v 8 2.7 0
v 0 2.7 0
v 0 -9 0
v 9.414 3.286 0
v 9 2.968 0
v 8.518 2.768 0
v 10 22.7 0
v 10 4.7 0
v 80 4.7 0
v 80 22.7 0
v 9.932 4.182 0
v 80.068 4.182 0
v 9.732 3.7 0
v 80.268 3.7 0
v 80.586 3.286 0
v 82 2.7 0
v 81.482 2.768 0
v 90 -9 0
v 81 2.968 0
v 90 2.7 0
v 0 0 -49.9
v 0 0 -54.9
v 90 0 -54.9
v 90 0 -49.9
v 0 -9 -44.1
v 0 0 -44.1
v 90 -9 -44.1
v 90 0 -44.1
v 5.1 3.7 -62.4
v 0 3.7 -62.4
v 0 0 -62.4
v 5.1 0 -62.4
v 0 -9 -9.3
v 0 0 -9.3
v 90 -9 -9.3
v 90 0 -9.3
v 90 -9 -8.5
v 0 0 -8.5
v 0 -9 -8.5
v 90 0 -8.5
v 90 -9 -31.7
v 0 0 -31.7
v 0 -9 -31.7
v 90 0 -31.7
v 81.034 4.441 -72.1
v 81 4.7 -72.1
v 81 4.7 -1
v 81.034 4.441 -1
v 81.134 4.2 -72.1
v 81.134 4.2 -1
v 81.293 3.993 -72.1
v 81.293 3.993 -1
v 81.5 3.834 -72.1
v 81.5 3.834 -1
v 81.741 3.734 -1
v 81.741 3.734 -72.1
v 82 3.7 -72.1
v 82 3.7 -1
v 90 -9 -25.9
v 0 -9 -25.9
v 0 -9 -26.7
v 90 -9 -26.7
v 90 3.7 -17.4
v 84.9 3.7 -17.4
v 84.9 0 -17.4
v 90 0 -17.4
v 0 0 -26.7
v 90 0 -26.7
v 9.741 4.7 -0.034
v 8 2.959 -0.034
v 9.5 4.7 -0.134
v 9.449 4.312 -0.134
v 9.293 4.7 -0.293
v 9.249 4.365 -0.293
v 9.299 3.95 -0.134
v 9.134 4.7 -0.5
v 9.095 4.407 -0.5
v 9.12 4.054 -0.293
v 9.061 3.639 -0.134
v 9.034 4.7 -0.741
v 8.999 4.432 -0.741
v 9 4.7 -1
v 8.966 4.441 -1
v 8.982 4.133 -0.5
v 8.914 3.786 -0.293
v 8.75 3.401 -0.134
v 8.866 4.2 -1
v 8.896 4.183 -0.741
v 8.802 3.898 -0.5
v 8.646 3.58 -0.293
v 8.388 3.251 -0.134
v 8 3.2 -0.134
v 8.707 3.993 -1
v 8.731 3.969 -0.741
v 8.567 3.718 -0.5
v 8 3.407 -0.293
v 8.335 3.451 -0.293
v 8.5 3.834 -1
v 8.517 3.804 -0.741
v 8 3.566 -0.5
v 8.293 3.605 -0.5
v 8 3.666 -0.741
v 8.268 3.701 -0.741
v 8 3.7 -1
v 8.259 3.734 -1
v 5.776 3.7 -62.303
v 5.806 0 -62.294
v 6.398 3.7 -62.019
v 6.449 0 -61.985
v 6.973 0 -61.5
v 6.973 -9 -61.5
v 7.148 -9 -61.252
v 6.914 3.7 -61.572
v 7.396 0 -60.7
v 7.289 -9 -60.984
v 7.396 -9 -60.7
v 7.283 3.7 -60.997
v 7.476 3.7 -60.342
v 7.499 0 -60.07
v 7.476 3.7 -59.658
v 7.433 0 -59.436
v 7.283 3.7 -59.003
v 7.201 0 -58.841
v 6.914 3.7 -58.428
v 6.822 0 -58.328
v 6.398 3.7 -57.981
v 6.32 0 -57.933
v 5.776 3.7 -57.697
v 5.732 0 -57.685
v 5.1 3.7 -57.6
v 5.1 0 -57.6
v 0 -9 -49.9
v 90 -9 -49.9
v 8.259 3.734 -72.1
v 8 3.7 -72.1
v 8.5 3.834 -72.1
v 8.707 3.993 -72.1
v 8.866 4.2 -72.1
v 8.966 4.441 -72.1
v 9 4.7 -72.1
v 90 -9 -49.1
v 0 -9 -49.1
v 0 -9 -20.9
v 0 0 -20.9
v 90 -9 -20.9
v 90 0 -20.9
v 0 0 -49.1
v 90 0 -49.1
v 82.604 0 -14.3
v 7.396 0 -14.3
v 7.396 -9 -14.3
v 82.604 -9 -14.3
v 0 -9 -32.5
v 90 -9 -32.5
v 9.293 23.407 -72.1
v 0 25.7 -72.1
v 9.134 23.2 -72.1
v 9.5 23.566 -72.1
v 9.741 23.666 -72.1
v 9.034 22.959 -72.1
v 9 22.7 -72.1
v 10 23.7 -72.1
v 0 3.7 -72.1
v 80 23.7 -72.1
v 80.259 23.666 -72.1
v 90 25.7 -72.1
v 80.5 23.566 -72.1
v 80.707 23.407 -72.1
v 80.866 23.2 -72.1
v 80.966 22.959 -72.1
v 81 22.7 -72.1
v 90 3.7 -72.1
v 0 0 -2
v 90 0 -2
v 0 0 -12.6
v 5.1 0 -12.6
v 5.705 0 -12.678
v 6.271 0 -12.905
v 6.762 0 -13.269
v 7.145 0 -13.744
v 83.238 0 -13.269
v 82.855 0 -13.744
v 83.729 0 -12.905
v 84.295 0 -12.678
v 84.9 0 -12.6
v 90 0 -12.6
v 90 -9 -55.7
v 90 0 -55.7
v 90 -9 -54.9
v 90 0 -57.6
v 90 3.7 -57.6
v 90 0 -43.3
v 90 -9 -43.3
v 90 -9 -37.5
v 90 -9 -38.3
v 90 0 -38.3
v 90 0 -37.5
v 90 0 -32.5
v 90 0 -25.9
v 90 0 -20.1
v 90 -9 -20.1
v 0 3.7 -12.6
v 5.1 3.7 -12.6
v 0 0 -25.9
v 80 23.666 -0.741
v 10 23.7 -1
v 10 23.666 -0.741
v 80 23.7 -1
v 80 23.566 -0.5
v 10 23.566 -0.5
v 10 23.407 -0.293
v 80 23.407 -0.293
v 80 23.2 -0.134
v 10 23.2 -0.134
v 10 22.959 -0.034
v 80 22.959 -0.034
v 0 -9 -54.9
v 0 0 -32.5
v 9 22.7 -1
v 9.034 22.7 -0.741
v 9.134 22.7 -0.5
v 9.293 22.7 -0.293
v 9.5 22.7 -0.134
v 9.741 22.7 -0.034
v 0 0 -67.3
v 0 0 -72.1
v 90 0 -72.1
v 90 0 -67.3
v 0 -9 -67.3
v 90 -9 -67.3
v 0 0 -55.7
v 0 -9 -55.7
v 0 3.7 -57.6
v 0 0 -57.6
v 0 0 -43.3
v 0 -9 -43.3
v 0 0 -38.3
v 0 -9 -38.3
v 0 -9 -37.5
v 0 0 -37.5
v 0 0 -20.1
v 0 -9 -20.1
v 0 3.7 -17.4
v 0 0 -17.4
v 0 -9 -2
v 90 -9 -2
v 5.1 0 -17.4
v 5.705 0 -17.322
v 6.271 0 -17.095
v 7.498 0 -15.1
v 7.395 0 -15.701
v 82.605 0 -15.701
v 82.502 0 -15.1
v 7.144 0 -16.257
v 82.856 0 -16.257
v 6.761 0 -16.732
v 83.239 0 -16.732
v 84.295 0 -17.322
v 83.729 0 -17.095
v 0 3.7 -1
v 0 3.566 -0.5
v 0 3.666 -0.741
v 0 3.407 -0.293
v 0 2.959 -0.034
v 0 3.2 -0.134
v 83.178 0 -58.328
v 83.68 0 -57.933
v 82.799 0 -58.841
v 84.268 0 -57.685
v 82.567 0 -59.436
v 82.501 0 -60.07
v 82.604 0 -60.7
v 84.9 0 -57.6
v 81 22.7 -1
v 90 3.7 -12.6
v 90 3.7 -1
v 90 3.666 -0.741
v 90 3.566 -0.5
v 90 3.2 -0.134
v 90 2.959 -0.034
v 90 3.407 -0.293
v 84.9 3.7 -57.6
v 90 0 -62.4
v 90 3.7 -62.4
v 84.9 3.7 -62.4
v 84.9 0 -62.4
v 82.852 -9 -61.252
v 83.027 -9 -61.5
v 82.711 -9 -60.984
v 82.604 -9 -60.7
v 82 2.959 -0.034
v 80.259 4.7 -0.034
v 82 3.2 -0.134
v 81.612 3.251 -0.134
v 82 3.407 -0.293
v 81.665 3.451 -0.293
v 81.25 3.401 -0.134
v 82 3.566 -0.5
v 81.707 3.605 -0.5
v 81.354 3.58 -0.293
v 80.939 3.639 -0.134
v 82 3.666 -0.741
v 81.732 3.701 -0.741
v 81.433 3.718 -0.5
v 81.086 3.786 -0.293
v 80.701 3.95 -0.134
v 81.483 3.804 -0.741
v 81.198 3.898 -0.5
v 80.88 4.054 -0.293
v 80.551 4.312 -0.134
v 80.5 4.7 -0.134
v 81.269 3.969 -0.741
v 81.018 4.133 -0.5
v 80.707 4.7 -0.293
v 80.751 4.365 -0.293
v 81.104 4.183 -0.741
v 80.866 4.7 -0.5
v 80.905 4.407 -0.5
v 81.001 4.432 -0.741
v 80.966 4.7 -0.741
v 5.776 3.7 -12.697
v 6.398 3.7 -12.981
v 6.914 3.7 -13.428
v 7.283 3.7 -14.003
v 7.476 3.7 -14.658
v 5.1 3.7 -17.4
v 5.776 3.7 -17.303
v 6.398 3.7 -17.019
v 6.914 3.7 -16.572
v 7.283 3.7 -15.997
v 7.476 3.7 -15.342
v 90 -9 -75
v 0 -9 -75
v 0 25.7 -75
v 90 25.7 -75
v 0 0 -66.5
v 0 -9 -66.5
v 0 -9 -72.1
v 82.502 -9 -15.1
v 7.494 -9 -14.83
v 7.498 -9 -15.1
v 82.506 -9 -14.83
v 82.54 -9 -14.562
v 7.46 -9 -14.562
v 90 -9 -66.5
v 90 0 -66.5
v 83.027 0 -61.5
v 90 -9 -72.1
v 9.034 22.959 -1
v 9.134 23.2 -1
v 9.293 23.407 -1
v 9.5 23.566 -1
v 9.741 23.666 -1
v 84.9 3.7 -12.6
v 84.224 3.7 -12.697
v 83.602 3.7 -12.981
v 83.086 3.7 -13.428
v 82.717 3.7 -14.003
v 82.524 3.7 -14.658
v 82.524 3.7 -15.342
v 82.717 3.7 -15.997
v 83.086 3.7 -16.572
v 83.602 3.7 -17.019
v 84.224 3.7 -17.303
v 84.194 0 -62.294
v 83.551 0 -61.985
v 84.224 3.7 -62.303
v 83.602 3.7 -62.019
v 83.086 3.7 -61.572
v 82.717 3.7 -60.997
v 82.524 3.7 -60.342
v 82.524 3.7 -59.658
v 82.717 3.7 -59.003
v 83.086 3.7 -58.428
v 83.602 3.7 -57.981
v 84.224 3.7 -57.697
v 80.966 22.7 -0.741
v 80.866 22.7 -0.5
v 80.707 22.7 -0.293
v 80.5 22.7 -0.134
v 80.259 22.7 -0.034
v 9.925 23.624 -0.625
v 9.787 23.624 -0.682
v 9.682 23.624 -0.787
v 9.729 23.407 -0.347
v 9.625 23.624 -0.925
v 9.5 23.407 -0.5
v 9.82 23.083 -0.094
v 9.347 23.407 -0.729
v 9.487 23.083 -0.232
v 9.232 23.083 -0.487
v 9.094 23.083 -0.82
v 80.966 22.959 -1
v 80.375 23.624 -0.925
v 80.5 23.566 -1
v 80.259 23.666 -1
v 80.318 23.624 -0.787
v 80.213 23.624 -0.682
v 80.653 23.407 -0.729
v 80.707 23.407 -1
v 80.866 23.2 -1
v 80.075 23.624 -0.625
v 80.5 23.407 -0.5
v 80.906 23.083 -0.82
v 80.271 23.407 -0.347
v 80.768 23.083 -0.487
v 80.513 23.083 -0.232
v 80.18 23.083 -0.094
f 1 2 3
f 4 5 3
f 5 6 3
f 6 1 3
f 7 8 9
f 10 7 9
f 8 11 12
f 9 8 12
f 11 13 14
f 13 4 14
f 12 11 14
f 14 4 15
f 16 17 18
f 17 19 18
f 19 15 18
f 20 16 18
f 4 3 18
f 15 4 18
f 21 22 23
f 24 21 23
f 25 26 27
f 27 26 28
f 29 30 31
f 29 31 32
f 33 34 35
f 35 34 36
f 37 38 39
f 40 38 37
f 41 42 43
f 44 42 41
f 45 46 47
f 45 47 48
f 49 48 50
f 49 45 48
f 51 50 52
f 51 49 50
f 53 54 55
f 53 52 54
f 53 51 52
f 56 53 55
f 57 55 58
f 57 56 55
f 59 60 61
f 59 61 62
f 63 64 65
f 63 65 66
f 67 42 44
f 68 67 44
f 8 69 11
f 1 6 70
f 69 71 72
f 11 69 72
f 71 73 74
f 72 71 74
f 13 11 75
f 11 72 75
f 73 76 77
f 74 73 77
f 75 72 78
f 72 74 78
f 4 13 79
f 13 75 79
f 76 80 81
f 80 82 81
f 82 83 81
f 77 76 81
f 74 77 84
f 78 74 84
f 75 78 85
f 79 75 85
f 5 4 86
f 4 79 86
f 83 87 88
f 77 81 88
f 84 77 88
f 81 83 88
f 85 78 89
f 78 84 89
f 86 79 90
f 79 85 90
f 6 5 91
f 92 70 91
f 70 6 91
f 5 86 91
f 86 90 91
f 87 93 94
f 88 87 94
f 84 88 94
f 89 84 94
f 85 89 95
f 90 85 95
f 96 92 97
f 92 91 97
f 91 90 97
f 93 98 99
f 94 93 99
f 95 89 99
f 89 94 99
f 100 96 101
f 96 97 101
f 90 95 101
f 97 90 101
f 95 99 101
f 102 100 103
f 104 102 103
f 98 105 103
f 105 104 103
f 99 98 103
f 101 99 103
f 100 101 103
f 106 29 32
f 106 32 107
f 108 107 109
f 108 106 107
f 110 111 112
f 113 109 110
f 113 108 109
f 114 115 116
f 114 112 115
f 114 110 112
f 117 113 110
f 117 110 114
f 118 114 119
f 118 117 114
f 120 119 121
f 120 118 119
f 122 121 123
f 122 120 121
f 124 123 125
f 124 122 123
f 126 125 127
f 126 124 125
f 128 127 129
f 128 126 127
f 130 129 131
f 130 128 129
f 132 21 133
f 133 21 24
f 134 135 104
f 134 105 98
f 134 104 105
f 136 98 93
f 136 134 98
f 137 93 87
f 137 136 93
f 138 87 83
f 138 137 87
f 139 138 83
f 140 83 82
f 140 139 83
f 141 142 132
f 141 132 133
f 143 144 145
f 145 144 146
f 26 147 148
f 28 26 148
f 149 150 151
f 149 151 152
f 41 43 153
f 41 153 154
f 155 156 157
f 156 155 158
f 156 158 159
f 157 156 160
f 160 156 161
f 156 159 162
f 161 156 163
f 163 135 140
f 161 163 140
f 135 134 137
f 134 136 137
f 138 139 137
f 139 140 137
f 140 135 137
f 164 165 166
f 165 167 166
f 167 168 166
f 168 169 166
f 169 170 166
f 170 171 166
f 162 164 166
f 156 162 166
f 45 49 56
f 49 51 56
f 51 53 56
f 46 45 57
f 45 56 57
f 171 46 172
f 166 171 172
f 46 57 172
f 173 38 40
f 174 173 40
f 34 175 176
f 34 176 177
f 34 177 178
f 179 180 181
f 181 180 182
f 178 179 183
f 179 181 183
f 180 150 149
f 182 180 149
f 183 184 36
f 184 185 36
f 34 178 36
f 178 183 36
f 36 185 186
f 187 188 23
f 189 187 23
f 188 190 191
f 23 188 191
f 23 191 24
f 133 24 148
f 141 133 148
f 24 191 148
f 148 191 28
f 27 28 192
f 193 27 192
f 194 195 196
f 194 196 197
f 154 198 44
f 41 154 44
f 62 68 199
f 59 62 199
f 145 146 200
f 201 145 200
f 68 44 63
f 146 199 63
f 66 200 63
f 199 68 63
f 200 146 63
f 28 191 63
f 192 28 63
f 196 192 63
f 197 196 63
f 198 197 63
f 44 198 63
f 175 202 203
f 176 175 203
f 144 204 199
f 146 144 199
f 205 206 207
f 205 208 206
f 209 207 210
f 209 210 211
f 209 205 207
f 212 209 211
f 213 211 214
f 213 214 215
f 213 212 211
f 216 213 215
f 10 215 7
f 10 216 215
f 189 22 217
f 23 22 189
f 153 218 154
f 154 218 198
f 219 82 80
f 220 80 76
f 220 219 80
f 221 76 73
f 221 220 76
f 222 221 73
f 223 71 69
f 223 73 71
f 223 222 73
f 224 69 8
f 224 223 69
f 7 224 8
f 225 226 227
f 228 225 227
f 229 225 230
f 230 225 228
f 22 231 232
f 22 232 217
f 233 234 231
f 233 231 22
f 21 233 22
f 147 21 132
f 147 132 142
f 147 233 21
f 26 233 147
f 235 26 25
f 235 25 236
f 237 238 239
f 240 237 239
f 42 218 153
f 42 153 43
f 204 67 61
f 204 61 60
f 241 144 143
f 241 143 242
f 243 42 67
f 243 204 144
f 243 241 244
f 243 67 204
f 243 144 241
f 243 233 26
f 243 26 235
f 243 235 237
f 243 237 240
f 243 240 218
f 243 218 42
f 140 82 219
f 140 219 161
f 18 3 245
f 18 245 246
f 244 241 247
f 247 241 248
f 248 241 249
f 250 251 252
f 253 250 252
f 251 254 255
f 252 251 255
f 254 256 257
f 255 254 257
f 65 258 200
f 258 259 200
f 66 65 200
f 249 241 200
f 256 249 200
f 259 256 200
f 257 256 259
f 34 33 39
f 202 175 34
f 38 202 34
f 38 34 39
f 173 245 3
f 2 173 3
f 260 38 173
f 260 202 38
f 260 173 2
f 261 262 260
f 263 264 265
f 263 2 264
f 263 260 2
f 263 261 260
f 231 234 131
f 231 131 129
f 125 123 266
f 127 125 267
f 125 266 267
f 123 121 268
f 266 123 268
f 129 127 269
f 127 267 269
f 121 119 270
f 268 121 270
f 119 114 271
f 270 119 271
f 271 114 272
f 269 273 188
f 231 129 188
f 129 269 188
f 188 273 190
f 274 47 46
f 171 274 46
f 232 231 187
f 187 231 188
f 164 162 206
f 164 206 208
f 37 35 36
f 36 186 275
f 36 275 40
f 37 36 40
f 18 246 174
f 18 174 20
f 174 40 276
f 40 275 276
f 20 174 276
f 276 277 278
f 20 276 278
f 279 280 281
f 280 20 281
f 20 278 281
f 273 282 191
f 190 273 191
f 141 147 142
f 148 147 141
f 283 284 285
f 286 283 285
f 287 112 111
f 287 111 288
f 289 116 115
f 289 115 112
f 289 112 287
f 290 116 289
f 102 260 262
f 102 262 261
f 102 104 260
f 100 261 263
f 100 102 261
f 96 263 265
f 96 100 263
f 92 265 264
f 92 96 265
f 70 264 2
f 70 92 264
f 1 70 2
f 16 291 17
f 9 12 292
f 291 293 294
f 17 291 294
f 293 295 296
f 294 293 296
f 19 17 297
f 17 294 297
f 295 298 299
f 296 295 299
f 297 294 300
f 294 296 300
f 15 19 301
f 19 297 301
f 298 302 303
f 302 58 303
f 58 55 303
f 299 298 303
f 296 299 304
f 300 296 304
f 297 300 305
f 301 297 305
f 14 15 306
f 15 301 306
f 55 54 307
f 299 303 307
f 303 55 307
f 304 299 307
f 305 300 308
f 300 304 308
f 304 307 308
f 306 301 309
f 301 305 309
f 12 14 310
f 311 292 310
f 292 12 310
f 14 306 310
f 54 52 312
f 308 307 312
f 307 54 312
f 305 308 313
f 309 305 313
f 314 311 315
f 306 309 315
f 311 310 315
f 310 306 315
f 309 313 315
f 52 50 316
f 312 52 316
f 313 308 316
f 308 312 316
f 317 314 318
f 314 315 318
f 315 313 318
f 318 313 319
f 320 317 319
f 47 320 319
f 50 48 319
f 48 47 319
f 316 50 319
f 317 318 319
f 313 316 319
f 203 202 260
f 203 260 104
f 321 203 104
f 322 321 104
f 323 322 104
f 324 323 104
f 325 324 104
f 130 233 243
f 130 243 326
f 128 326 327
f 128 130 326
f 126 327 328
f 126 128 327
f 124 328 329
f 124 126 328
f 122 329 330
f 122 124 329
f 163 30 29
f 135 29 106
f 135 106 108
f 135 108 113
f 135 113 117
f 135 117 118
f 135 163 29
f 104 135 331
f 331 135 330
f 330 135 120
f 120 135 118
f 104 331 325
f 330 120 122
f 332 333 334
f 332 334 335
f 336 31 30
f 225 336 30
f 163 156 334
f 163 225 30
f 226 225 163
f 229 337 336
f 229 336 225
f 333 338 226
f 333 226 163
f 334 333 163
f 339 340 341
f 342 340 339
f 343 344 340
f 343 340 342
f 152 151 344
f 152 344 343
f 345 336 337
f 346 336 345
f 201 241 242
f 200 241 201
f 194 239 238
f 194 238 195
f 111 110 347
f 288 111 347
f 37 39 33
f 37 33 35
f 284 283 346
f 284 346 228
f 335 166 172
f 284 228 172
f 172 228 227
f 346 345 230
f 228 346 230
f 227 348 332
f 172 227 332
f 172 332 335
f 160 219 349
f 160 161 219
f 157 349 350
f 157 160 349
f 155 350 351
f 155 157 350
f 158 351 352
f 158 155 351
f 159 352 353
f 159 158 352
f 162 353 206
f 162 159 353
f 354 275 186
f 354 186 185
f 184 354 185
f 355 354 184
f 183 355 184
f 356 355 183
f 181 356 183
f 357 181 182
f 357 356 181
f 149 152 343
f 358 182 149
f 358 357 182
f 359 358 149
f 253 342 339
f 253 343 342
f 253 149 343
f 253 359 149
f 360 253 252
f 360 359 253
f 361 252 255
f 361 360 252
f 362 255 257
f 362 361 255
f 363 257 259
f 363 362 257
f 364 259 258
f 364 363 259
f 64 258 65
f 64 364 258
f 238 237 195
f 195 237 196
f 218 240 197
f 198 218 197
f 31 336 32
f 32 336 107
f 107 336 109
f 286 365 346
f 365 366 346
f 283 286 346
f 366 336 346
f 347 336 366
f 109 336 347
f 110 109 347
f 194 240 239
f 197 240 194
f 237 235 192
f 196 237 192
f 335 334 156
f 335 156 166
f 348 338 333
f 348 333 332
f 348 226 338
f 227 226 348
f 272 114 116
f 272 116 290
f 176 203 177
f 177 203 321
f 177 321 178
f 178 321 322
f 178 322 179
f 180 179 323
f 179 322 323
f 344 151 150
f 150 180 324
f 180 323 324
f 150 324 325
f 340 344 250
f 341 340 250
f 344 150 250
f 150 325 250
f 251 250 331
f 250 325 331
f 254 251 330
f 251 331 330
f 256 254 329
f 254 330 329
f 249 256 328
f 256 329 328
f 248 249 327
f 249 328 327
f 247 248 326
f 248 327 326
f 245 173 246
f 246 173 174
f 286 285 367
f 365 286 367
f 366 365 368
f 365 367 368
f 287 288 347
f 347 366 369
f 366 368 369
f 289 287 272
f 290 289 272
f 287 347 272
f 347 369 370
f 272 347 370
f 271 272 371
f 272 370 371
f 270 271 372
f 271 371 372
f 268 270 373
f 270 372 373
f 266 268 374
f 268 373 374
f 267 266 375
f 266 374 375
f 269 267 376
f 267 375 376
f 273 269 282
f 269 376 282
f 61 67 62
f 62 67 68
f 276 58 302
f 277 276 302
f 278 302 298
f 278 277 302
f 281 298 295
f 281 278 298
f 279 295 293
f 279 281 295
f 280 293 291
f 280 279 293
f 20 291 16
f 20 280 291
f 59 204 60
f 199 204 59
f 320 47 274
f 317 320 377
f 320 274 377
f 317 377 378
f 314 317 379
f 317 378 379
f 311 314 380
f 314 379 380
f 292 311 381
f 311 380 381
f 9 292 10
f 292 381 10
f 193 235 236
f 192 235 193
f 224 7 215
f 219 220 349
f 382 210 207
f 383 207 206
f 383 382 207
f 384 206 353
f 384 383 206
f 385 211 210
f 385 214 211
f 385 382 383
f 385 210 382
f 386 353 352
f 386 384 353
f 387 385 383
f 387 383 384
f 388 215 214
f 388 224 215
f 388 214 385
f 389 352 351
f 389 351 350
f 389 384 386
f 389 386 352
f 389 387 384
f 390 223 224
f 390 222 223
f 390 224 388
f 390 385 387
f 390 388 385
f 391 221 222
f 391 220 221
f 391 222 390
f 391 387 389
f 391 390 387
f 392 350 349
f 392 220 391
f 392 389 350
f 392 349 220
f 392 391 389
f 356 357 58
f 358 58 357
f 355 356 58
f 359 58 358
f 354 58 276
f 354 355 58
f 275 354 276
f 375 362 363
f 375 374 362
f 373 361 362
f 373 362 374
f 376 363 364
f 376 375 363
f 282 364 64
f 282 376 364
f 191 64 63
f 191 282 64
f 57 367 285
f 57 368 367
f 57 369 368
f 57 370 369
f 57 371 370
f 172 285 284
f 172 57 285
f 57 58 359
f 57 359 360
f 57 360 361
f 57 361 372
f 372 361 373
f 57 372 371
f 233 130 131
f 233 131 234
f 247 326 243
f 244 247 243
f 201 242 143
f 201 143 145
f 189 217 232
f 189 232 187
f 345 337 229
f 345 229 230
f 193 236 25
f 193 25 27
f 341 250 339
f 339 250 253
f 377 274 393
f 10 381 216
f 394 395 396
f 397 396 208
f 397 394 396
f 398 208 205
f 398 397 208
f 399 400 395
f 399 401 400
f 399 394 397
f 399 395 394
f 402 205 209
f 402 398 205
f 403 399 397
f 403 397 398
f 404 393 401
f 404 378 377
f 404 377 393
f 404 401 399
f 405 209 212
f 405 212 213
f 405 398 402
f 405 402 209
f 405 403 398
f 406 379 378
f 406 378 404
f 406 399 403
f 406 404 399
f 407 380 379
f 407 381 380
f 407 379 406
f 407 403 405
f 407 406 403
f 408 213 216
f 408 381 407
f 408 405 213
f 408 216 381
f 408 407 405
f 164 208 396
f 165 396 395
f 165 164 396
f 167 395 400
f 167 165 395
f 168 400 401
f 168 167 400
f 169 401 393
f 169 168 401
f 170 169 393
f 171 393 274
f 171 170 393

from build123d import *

# Parameters (mm, degrees)
ESQUISSE1_W             = 90
ESQUISSE1_H             = 75
BOSS_EXTRU_1_DEPTH      = 3.7
ESQUISSE2_W             = 90
ESQUISSE2_H             = 2.9
ESQUISSE2_H_2           = 2
ESQUISSE2_H_3           = 0.8
BOSS_EXTRU_2_DEPTH      = 9
ENL_V_MAT_EXTRU_1_DEPTH = 118.84010353
ESQUISSE4_W             = 90
ESQUISSE4_H             = 2.9
BOSS_EXTRU_3_DEPTH      = 22
ESQUISSE5_W             = 72
ESQUISSE5_H             = 72.1
BOSS_EXTRU_4_DEPTH      = 20
CONG_1_R                = 1


with BuildPart() as part:
    # Esquisse1 → Boss.-Extru.1 (new body)
    with BuildSketch(Plane(origin=(0, 0, 0), x_dir=(1, 0, 0), z_dir=(0, 1, 0))):
        with Locations((45, 37.5)):
            Rectangle(ESQUISSE1_W, ESQUISSE1_H)
    extrude(amount=BOSS_EXTRU_1_DEPTH)

    # Esquisse2 → Boss.-Extru.2 (add)
    with BuildSketch(Plane.XZ):
        with Locations((45, -73.55)):
            Rectangle(ESQUISSE2_W, ESQUISSE2_H)
        with Locations((45, -1)):
            Rectangle(ESQUISSE2_W, ESQUISSE2_H_2)
        with Locations((45, -66.9)):
            Rectangle(ESQUISSE2_W, ESQUISSE2_H_3)
        with Locations((45, -61.1)):
            Rectangle(ESQUISSE2_W, ESQUISSE2_H_3)
        with Locations((45, -55.3)):
            Rectangle(ESQUISSE2_W, ESQUISSE2_H_3)
        with Locations((45, -49.5)):
            Rectangle(ESQUISSE2_W, ESQUISSE2_H_3)
        with Locations((45, -43.7)):
            Rectangle(ESQUISSE2_W, ESQUISSE2_H_3)
        with Locations((45, -37.9)):
            Rectangle(ESQUISSE2_W, ESQUISSE2_H_3)
        with Locations((45, -32.1)):
            Rectangle(ESQUISSE2_W, ESQUISSE2_H_3)
        with Locations((45, -26.3)):
            Rectangle(ESQUISSE2_W, ESQUISSE2_H_3)
        with Locations((45, -20.5)):
            Rectangle(ESQUISSE2_W, ESQUISSE2_H_3)
        with Locations((45, -14.7)):
            Rectangle(ESQUISSE2_W, ESQUISSE2_H_3)
        with Locations((45, -8.9)):
            Rectangle(ESQUISSE2_W, ESQUISSE2_H_3)
    extrude(amount=BOSS_EXTRU_2_DEPTH)

    # Esquisse3 → Enlèv. mat.-Extru.1 (cut, through all)
    with BuildSketch(Plane(origin=(0, 3.7, 0), x_dir=(1, 0, 0), z_dir=(0, 1, 0))):
        with BuildLine():
            Line((90, 12.6), (84.9, 12.6))
            ThreePointArc((84.9, 12.6), (82.5, 15), (84.9, 17.4))
            Line((84.9, 17.4), (90, 17.4))
            Line((90, 17.4), (90, 12.6))
        make_face()
        with BuildLine():
            Line((84.9, 57.6), (90, 57.6))
            Line((90, 57.6), (90, 62.4))
            Line((90, 62.4), (84.9, 62.4))
            ThreePointArc((84.9, 62.4), (82.5, 60), (84.9, 57.6))
        make_face()
        with BuildLine():
            Line((0, 57.6), (0, 62.4))
            Line((0, 62.4), (5.1, 62.4))
            ThreePointArc((5.1, 62.4), (7.5, 60), (5.1, 57.6))
            Line((5.1, 57.6), (0, 57.6))
        make_face()
        with BuildLine():
            Line((0, 17.4), (0, 12.6))
            Line((0, 12.6), (5.1, 12.6))
            ThreePointArc((5.1, 12.6), (7.5, 15), (5.1, 17.4))
            Line((5.1, 17.4), (0, 17.4))
        make_face()
    extrude(amount=-ENL_V_MAT_EXTRU_1_DEPTH, mode=Mode.SUBTRACT)

    # Esquisse4 → Boss.-Extru.3 (add)
    with BuildSketch(Plane(origin=(0, 3.7, 0), x_dir=(1, 0, 0), z_dir=(0, 1, 0))):
        with Locations((45, 73.55)):
            Rectangle(ESQUISSE4_W, ESQUISSE4_H)
    extrude(amount=BOSS_EXTRU_3_DEPTH)

    # Esquisse5 → Boss.-Extru.4 (add)
    with BuildSketch(Plane(origin=(0, 3.7, 0), x_dir=(1, 0, 0), z_dir=(0, 1, 0))):
        with Locations((45, 36.05)):
            Rectangle(ESQUISSE5_W, ESQUISSE5_H)
    extrude(amount=BOSS_EXTRU_4_DEPTH)

    # Congé1
    cong_1_edges = [part.edges().sort_by_distance(p)[0] for p in [
        (4.5, 3.7, 0),
        (85.5, 3.7, 0),
        (9, 3.7, -36.05),
        (81, 13.7, 0),
        (81, 3.7, -36.05),
        (81, 23.7, -36.05),
        (9, 13.7, 0),
        (45, 23.7, 0),
        (9, 23.7, -36.05),
    ]]
    fillet(cong_1_edges, radius=CONG_1_R)


solid = part.part
